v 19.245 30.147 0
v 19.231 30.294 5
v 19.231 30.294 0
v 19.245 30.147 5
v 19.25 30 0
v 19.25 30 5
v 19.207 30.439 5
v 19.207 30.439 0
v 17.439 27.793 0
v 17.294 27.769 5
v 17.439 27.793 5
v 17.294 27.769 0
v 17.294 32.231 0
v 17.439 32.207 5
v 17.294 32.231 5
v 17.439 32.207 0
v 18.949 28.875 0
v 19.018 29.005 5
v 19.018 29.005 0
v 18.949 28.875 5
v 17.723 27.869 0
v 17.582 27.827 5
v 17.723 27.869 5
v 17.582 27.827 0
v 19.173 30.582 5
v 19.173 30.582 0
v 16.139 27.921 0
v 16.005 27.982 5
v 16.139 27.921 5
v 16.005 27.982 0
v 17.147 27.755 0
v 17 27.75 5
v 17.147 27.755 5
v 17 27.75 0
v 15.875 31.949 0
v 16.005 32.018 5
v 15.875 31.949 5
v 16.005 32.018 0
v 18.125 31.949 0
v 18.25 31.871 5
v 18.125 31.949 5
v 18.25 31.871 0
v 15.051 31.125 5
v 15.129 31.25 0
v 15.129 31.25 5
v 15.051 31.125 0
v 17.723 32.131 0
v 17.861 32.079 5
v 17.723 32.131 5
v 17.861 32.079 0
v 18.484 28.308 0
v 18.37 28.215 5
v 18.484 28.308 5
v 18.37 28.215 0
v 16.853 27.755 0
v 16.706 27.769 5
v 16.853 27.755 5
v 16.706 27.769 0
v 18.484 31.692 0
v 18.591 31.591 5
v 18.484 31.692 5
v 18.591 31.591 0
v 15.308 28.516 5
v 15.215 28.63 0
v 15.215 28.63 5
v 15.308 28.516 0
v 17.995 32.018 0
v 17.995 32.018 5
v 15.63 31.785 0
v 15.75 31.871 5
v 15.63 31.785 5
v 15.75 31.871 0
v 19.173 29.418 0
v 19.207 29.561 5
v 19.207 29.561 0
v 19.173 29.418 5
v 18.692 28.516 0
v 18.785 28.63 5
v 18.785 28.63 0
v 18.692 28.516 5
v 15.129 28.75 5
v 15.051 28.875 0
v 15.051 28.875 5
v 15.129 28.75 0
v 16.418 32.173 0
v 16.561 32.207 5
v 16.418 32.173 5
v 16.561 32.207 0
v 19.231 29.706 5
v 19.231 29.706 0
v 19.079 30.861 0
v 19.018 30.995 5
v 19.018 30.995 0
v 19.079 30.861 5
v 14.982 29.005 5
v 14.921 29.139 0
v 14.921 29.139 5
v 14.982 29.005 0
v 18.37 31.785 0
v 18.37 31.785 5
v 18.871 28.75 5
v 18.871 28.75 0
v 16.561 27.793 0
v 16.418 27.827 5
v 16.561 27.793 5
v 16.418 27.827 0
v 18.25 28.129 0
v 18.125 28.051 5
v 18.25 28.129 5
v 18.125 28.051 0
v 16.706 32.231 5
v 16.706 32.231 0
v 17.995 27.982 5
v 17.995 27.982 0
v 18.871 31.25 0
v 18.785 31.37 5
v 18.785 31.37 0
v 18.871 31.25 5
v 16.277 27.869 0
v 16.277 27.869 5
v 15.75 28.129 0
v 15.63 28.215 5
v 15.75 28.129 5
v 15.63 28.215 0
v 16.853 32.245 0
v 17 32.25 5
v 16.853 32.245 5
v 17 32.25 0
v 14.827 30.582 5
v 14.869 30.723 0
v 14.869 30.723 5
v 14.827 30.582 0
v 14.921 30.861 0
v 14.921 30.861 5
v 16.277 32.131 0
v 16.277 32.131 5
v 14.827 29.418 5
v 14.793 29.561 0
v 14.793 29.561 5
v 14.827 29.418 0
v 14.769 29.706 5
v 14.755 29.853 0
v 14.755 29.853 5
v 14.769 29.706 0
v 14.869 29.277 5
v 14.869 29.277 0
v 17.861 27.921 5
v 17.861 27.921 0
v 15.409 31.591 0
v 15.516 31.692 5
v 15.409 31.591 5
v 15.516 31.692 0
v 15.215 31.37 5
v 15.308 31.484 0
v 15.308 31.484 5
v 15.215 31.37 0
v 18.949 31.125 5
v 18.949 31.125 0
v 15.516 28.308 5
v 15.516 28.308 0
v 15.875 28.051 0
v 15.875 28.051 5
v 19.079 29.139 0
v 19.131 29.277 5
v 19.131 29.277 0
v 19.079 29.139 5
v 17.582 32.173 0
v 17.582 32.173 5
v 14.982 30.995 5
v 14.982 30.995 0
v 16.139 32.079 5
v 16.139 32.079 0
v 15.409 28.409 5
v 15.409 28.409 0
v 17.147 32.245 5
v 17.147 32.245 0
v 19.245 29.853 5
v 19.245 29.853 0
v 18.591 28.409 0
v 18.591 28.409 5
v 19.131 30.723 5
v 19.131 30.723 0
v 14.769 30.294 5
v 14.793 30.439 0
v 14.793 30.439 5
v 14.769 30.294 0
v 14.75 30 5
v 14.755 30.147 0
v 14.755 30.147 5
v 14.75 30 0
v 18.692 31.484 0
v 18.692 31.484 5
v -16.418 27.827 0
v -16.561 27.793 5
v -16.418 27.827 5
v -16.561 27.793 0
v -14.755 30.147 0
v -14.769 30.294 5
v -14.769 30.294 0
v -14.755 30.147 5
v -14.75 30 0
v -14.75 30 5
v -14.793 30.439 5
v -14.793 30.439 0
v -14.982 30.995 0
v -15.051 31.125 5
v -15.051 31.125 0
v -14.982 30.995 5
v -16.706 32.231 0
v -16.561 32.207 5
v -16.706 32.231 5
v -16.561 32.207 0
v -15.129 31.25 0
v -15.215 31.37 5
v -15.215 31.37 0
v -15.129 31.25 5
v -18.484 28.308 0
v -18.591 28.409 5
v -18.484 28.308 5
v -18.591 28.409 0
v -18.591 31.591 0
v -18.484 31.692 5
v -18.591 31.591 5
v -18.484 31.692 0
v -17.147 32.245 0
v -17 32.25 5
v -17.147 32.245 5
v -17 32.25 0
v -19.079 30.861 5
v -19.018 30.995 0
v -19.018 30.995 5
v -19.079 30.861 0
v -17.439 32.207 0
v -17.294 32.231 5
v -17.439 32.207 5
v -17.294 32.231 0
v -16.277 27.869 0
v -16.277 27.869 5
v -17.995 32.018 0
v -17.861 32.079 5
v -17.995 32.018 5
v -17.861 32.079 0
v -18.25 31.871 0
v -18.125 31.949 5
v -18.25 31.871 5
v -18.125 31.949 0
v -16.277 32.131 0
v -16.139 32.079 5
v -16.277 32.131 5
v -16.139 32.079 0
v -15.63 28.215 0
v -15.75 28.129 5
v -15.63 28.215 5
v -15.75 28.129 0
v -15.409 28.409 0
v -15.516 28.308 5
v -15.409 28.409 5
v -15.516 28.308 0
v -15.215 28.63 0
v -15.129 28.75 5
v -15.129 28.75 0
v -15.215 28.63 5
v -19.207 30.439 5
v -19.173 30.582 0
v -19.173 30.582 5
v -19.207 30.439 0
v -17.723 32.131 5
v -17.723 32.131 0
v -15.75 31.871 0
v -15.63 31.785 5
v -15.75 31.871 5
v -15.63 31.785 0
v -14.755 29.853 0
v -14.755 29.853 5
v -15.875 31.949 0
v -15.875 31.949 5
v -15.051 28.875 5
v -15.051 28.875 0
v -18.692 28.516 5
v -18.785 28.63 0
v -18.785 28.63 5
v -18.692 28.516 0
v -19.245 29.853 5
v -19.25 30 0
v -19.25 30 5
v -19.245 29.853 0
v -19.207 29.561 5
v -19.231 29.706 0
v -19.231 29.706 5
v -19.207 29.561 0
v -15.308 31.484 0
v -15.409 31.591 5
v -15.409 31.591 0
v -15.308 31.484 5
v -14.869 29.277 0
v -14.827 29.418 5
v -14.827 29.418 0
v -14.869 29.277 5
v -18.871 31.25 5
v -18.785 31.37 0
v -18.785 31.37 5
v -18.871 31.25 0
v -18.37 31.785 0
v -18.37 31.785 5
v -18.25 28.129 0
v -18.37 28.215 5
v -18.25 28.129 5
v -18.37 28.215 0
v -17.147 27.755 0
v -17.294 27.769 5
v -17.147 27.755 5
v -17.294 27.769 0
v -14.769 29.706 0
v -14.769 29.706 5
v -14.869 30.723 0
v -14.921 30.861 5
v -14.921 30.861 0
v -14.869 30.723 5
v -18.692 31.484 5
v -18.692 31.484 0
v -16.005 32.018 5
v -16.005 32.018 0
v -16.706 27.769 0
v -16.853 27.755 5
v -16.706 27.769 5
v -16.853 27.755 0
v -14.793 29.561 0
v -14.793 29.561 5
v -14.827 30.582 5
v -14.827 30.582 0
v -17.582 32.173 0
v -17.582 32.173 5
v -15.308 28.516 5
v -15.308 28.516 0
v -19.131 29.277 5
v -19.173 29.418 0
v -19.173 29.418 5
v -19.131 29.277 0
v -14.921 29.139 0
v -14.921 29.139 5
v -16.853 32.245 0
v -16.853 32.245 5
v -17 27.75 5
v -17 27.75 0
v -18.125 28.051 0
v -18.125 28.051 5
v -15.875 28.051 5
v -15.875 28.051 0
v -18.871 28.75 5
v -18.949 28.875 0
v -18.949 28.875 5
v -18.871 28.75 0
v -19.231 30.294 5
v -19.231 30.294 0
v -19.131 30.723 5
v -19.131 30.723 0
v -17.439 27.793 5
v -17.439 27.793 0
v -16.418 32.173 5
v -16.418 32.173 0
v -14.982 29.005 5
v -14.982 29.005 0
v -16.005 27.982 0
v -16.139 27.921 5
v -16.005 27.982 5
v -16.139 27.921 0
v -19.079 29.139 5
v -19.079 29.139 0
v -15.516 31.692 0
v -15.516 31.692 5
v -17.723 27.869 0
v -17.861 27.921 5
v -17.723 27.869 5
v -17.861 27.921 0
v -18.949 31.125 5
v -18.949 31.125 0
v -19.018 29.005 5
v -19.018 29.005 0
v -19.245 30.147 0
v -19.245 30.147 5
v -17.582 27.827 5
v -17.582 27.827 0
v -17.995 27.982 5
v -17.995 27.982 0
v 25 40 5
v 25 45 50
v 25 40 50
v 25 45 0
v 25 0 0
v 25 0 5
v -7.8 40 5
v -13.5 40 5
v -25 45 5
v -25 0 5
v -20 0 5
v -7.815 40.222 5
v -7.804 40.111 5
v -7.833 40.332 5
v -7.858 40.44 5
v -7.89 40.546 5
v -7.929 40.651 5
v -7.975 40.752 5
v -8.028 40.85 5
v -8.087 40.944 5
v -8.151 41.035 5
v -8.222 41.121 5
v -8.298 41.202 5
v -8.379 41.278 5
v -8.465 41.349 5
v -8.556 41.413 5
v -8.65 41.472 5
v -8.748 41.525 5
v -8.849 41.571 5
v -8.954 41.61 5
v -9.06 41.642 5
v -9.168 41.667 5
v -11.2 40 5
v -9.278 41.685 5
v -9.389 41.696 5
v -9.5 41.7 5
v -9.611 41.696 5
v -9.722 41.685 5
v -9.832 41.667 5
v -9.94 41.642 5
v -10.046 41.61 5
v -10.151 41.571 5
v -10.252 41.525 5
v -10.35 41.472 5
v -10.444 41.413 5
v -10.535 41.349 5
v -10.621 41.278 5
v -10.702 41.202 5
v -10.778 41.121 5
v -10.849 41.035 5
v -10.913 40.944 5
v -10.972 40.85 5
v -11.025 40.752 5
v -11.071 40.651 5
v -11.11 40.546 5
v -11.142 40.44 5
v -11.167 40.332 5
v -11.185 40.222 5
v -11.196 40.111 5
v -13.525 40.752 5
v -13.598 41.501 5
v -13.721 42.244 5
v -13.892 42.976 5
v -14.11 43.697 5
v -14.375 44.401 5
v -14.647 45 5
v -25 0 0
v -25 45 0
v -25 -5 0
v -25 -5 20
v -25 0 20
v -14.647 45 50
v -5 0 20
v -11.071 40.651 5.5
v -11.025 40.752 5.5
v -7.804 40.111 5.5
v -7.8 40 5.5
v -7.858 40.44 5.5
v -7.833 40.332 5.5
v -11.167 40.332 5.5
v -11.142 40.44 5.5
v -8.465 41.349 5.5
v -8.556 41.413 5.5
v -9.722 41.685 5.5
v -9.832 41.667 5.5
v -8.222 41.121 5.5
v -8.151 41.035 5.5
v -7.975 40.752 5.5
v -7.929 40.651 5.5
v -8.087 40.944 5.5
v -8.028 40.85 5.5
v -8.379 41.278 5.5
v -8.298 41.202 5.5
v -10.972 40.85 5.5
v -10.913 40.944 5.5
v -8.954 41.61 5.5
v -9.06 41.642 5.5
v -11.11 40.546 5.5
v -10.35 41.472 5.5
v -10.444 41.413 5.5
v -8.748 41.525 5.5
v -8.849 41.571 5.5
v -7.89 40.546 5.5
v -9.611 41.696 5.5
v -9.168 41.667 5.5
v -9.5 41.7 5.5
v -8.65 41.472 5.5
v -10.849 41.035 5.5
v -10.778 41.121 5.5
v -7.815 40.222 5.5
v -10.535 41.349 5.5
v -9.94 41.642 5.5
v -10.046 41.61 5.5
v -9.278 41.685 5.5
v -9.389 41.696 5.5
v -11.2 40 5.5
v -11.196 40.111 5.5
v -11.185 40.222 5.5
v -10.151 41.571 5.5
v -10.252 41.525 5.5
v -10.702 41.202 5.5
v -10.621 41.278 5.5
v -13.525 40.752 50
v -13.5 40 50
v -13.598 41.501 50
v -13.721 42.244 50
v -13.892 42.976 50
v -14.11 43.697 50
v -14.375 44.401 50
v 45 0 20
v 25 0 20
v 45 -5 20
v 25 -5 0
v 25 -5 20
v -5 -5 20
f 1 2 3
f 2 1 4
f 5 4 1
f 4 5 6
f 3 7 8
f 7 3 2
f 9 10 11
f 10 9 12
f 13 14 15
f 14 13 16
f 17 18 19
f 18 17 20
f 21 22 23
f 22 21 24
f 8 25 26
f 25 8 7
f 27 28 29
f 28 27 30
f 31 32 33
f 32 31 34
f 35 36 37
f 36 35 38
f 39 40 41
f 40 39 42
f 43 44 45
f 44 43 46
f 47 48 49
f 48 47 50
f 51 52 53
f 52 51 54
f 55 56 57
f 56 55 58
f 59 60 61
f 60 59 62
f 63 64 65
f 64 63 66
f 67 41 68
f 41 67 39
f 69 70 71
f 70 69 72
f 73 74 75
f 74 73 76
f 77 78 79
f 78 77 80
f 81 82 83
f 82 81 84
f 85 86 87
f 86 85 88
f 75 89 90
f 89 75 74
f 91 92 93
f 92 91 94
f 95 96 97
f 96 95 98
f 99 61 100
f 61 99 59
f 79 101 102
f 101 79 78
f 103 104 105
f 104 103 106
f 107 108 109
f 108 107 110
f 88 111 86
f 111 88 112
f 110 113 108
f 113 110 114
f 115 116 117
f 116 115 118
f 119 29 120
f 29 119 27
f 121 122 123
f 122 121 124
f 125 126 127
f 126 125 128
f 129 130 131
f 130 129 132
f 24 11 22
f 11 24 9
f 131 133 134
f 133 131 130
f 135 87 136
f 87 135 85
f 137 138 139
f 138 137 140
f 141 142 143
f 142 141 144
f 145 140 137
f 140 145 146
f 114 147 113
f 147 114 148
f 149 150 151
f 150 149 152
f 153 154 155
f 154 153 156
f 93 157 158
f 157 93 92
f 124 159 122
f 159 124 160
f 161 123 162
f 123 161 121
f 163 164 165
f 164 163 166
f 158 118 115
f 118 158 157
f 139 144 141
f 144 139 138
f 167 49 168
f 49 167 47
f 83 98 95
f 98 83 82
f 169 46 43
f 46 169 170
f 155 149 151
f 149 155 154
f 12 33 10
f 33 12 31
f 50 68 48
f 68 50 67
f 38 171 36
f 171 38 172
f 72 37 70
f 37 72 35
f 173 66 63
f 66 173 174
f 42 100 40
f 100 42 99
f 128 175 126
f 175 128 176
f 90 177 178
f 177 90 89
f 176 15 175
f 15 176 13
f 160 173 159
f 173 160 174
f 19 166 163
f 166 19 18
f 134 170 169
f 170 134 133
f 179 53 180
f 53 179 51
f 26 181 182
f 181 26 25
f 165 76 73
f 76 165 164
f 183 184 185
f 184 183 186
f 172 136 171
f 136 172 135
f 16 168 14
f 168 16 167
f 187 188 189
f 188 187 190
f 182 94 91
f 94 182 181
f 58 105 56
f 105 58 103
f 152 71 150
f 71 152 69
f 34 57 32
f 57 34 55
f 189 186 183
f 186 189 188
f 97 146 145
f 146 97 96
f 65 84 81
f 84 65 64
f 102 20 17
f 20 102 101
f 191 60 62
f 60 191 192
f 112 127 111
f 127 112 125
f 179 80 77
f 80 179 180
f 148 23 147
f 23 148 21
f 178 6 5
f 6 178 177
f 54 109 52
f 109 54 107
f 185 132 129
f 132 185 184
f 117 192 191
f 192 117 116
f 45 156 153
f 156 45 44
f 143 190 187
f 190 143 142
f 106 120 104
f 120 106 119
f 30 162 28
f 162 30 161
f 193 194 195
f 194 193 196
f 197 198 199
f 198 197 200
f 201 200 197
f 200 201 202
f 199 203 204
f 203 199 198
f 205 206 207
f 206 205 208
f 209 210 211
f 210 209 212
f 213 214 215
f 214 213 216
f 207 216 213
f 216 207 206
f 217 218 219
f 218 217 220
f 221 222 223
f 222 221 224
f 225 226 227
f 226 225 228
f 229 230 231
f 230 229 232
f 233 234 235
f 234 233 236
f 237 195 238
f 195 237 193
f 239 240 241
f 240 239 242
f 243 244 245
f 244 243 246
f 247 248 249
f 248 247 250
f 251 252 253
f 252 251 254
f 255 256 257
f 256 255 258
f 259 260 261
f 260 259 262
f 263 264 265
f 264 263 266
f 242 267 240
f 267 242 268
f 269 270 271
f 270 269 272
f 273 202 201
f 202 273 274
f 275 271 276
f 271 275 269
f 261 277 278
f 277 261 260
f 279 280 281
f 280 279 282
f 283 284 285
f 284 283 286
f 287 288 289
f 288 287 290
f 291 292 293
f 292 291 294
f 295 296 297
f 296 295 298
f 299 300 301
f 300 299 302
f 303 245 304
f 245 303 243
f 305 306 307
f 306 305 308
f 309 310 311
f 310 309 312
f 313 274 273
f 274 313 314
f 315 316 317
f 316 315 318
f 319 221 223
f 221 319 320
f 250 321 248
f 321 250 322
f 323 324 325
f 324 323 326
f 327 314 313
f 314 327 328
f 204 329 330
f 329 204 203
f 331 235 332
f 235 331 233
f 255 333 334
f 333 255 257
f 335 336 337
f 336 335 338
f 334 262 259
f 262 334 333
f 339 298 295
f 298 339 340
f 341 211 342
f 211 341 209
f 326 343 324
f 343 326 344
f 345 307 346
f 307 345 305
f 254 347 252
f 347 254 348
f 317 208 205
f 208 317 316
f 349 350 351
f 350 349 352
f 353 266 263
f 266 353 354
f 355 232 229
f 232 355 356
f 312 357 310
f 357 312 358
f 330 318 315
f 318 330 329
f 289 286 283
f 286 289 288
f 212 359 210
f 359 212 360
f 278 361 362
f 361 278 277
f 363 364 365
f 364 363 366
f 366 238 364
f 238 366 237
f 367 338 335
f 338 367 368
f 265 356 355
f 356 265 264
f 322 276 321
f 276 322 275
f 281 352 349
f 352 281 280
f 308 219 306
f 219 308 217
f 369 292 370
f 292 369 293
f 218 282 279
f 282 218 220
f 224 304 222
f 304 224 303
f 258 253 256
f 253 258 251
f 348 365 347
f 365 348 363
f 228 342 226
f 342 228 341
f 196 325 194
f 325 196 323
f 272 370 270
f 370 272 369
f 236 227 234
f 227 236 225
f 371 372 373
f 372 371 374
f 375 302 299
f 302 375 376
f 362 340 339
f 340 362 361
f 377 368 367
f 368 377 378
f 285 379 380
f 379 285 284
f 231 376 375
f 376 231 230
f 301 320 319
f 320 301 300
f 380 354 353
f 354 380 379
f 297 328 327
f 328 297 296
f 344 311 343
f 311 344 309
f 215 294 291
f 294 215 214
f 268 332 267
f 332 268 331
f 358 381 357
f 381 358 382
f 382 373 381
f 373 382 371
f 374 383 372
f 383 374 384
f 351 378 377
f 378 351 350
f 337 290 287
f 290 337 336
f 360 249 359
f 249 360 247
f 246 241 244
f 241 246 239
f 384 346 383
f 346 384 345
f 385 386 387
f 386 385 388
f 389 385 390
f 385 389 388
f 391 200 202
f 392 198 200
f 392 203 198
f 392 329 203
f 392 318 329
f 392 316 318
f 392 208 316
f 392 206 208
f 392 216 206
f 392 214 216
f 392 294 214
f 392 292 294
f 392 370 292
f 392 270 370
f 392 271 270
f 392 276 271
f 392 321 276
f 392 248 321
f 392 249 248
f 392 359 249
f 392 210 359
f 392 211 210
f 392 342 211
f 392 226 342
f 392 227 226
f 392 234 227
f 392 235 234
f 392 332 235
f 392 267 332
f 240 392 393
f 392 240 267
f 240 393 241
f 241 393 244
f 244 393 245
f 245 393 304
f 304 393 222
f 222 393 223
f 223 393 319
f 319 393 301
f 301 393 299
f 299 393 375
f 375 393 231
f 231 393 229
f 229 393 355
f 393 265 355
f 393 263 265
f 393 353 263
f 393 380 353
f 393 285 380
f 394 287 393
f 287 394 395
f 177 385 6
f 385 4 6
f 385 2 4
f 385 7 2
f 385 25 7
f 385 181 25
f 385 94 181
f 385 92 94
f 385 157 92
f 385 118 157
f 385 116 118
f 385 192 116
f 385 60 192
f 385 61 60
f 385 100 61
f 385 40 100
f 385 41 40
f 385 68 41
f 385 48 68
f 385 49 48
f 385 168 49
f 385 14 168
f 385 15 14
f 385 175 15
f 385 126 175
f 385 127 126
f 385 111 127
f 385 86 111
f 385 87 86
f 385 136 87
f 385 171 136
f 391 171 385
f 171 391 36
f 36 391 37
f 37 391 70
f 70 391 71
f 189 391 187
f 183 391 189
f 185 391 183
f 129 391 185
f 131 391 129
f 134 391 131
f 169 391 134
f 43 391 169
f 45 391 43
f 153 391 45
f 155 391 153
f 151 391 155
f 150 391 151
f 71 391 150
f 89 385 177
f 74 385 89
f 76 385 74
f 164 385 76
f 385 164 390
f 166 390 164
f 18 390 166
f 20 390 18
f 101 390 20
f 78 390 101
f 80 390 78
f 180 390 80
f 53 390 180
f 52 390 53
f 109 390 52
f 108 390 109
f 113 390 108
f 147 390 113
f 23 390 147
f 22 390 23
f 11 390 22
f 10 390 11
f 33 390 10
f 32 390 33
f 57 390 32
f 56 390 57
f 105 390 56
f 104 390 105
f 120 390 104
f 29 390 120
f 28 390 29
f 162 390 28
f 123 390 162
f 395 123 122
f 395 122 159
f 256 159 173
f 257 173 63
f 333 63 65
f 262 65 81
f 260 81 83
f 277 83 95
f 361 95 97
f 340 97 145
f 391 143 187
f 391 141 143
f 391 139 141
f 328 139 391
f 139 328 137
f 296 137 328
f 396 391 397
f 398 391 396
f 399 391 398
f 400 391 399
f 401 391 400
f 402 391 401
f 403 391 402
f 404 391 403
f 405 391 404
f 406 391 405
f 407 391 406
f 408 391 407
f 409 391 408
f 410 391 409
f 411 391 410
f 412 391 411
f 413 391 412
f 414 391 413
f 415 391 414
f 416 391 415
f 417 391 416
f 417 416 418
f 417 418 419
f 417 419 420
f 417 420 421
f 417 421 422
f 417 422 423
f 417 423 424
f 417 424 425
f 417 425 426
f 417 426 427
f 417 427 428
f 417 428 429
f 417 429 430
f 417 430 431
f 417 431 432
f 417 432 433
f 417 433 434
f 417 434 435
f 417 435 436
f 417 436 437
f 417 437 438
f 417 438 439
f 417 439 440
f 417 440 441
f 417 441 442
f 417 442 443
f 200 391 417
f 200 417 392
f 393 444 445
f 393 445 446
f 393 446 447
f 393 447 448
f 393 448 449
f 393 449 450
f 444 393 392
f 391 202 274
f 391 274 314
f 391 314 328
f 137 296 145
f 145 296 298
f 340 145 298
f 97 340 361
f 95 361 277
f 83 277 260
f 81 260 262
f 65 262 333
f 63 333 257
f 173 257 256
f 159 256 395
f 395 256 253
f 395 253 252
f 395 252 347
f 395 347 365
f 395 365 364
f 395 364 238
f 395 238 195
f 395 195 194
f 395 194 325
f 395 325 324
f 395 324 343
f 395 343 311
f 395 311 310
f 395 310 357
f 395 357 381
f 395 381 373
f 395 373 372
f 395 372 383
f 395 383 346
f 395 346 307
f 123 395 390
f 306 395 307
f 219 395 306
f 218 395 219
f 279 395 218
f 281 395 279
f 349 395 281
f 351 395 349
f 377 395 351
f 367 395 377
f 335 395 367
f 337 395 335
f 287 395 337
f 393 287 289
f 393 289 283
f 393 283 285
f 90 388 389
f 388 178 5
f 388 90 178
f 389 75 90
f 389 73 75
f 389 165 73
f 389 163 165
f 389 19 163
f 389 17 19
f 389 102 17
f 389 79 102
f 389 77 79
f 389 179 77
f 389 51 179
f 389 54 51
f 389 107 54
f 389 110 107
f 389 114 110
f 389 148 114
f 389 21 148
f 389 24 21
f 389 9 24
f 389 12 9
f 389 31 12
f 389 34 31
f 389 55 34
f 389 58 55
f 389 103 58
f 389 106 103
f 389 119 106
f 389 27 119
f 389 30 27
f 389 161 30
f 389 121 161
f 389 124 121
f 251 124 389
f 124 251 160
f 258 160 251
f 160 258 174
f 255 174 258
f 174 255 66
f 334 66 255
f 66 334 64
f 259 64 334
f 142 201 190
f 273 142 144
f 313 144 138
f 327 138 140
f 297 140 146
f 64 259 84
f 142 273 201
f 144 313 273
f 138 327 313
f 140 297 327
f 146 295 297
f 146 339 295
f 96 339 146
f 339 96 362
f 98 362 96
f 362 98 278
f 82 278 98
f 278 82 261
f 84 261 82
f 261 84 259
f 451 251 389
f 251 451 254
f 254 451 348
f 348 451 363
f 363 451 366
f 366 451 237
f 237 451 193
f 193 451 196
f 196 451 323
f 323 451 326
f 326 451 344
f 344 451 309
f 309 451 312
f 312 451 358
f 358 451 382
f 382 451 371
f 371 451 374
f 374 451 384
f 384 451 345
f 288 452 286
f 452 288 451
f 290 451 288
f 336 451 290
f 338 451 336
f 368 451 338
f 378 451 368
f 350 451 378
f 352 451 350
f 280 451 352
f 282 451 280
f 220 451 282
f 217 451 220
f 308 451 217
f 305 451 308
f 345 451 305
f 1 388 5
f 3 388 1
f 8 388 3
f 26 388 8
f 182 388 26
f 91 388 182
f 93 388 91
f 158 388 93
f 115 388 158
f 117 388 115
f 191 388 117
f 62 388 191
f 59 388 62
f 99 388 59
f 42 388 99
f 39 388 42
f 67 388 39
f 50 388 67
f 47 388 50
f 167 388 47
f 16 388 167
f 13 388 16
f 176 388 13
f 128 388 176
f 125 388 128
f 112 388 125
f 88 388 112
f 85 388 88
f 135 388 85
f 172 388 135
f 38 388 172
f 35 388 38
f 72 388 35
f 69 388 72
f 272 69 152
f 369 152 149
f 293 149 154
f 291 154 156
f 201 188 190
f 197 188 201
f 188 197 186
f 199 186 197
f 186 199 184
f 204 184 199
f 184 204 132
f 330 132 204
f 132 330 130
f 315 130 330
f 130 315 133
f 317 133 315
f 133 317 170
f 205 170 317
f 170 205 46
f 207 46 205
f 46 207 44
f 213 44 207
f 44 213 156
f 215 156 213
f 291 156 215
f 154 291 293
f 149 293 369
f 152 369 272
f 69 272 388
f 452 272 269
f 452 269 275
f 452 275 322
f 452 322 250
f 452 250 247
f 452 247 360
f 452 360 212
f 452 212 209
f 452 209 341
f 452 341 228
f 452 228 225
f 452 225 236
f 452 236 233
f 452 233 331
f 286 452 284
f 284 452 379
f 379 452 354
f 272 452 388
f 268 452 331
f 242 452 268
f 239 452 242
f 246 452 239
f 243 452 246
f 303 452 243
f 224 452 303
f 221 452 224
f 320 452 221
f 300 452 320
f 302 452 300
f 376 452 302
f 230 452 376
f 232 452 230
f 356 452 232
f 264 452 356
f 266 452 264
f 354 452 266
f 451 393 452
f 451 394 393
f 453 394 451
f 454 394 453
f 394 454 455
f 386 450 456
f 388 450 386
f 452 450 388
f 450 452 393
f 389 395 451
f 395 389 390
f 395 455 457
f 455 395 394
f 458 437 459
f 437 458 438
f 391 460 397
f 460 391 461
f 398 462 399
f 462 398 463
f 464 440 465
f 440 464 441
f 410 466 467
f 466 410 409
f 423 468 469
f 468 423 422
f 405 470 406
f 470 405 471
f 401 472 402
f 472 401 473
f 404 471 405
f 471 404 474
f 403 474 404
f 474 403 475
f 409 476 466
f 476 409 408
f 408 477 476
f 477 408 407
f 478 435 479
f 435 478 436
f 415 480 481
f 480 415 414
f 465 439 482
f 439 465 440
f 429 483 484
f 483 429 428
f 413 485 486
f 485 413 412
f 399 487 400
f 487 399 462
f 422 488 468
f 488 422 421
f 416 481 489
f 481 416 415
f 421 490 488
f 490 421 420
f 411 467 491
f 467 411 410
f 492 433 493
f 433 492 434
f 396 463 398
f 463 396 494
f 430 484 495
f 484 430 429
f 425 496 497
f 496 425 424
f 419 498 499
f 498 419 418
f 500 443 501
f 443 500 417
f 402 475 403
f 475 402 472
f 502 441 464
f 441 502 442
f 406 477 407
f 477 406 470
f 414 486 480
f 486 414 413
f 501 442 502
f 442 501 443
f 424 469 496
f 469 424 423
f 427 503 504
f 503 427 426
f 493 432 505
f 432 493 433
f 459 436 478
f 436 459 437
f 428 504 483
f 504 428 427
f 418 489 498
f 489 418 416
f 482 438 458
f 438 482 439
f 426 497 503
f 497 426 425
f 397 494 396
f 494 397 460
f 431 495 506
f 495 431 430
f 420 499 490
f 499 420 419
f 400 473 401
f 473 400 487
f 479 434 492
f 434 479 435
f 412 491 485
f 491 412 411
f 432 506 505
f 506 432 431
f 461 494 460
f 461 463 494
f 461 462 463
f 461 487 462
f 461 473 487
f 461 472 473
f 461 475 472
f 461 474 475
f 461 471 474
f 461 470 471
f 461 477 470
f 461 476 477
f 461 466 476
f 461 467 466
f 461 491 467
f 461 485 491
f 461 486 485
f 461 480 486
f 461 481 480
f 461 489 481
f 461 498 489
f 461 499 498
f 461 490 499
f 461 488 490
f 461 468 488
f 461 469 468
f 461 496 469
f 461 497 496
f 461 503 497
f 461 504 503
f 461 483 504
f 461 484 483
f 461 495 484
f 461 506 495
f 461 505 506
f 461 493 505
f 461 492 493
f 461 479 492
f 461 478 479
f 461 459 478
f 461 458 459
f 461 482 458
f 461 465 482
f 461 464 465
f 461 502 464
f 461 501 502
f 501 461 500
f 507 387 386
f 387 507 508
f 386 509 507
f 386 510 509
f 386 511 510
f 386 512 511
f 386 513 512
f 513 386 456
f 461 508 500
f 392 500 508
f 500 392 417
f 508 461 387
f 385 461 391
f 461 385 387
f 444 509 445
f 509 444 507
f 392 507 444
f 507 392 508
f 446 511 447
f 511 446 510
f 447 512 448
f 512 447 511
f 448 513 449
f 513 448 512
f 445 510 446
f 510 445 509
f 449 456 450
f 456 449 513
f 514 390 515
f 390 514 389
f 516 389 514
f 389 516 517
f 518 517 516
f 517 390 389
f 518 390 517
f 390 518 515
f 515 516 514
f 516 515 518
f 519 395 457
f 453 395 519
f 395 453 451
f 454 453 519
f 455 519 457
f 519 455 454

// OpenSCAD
// L-shaped mounting bracket for a NEMA 17 stepper motor (e.g. syringe pump)
// Print orientation: base plate on the bed, vertical plate builds upward (+Z)

// ---------------- Parameters ----------------
plate_w      = 50;    // base plate length (X), also vertical plate width (X)
plate_h      = 45;    // base plate depth (Y)
plate_t      = 5;     // base plate thickness (Z)

hole_m4_x    = -17;   // M4 through-hole X position (base plate)
hole_m4_y    = 30;    // M4 through-hole Y position (base plate)
hole_m4_d    = 4.5;   // M4 through-hole diameter

motor_h      = 50;    // vertical motor plate height (Z)
motor_d      = 23;    // motor centring boss hole diameter
motor_z      = 28;    // motor boss hole centre height (Z)

screw_d      = 3.4;   // M3 screw hole diameter
screw_pitch  = 31;    // M3 screw hole square pattern size (X and Y)

gusset_t     = 5;     // triangular gusset thickness (Y)
gusset_l     = 20;    // gusset leg length along +Y and +Z
gusset_x0    = -25;   // gusset start X (left edge)
gusset_x1    = 20;    // gusset start X (right edge)

eps          = 0.5;   // cutter overshoot past faces

$fn = 96;

// ---------------- Model ----------------
union() {
    // Base plate with M4 through-holes
    difference() {
        translate([-plate_w/2, 0, 0])
            cube([plate_w, plate_h, plate_t]);
        for (sx = [-1, 1])
            translate([sx * hole_m4_x, hole_m4_y, -eps])
                cylinder(d = hole_m4_d, h = plate_t + 2*eps);
    }

    // Vertical motor plate with boss hole and M3 screw holes
    translate([-plate_w/2, plate_h - gusset_t, 0])
        difference() {
            cube([plate_w, gusset_t, motor_h]);
            translate([0, 0, -eps])
                cylinder(d = motor_d, h = motor_h + 2*eps);
            for (a = [0, 90, 180, 270])
                rotate([0, 0, a])
                    translate([-screw_pitch/2, 0, -eps])
                        cylinder(d = screw_d, h = gusset_t + 2*eps);
        }

    // Triangular gussets, flush with the outer X edges
    for (sx = [-1, 1])
        translate([sx * gusset_x0, 0, 0])
            rotate([90, 0, 0])
                linear_extrude(height = gusset_t)
                    polygon(points = [
                        [0, 0],
                        [0, gusset_l],
                        [gusset_l, gusset_l]
                    ]);
}
